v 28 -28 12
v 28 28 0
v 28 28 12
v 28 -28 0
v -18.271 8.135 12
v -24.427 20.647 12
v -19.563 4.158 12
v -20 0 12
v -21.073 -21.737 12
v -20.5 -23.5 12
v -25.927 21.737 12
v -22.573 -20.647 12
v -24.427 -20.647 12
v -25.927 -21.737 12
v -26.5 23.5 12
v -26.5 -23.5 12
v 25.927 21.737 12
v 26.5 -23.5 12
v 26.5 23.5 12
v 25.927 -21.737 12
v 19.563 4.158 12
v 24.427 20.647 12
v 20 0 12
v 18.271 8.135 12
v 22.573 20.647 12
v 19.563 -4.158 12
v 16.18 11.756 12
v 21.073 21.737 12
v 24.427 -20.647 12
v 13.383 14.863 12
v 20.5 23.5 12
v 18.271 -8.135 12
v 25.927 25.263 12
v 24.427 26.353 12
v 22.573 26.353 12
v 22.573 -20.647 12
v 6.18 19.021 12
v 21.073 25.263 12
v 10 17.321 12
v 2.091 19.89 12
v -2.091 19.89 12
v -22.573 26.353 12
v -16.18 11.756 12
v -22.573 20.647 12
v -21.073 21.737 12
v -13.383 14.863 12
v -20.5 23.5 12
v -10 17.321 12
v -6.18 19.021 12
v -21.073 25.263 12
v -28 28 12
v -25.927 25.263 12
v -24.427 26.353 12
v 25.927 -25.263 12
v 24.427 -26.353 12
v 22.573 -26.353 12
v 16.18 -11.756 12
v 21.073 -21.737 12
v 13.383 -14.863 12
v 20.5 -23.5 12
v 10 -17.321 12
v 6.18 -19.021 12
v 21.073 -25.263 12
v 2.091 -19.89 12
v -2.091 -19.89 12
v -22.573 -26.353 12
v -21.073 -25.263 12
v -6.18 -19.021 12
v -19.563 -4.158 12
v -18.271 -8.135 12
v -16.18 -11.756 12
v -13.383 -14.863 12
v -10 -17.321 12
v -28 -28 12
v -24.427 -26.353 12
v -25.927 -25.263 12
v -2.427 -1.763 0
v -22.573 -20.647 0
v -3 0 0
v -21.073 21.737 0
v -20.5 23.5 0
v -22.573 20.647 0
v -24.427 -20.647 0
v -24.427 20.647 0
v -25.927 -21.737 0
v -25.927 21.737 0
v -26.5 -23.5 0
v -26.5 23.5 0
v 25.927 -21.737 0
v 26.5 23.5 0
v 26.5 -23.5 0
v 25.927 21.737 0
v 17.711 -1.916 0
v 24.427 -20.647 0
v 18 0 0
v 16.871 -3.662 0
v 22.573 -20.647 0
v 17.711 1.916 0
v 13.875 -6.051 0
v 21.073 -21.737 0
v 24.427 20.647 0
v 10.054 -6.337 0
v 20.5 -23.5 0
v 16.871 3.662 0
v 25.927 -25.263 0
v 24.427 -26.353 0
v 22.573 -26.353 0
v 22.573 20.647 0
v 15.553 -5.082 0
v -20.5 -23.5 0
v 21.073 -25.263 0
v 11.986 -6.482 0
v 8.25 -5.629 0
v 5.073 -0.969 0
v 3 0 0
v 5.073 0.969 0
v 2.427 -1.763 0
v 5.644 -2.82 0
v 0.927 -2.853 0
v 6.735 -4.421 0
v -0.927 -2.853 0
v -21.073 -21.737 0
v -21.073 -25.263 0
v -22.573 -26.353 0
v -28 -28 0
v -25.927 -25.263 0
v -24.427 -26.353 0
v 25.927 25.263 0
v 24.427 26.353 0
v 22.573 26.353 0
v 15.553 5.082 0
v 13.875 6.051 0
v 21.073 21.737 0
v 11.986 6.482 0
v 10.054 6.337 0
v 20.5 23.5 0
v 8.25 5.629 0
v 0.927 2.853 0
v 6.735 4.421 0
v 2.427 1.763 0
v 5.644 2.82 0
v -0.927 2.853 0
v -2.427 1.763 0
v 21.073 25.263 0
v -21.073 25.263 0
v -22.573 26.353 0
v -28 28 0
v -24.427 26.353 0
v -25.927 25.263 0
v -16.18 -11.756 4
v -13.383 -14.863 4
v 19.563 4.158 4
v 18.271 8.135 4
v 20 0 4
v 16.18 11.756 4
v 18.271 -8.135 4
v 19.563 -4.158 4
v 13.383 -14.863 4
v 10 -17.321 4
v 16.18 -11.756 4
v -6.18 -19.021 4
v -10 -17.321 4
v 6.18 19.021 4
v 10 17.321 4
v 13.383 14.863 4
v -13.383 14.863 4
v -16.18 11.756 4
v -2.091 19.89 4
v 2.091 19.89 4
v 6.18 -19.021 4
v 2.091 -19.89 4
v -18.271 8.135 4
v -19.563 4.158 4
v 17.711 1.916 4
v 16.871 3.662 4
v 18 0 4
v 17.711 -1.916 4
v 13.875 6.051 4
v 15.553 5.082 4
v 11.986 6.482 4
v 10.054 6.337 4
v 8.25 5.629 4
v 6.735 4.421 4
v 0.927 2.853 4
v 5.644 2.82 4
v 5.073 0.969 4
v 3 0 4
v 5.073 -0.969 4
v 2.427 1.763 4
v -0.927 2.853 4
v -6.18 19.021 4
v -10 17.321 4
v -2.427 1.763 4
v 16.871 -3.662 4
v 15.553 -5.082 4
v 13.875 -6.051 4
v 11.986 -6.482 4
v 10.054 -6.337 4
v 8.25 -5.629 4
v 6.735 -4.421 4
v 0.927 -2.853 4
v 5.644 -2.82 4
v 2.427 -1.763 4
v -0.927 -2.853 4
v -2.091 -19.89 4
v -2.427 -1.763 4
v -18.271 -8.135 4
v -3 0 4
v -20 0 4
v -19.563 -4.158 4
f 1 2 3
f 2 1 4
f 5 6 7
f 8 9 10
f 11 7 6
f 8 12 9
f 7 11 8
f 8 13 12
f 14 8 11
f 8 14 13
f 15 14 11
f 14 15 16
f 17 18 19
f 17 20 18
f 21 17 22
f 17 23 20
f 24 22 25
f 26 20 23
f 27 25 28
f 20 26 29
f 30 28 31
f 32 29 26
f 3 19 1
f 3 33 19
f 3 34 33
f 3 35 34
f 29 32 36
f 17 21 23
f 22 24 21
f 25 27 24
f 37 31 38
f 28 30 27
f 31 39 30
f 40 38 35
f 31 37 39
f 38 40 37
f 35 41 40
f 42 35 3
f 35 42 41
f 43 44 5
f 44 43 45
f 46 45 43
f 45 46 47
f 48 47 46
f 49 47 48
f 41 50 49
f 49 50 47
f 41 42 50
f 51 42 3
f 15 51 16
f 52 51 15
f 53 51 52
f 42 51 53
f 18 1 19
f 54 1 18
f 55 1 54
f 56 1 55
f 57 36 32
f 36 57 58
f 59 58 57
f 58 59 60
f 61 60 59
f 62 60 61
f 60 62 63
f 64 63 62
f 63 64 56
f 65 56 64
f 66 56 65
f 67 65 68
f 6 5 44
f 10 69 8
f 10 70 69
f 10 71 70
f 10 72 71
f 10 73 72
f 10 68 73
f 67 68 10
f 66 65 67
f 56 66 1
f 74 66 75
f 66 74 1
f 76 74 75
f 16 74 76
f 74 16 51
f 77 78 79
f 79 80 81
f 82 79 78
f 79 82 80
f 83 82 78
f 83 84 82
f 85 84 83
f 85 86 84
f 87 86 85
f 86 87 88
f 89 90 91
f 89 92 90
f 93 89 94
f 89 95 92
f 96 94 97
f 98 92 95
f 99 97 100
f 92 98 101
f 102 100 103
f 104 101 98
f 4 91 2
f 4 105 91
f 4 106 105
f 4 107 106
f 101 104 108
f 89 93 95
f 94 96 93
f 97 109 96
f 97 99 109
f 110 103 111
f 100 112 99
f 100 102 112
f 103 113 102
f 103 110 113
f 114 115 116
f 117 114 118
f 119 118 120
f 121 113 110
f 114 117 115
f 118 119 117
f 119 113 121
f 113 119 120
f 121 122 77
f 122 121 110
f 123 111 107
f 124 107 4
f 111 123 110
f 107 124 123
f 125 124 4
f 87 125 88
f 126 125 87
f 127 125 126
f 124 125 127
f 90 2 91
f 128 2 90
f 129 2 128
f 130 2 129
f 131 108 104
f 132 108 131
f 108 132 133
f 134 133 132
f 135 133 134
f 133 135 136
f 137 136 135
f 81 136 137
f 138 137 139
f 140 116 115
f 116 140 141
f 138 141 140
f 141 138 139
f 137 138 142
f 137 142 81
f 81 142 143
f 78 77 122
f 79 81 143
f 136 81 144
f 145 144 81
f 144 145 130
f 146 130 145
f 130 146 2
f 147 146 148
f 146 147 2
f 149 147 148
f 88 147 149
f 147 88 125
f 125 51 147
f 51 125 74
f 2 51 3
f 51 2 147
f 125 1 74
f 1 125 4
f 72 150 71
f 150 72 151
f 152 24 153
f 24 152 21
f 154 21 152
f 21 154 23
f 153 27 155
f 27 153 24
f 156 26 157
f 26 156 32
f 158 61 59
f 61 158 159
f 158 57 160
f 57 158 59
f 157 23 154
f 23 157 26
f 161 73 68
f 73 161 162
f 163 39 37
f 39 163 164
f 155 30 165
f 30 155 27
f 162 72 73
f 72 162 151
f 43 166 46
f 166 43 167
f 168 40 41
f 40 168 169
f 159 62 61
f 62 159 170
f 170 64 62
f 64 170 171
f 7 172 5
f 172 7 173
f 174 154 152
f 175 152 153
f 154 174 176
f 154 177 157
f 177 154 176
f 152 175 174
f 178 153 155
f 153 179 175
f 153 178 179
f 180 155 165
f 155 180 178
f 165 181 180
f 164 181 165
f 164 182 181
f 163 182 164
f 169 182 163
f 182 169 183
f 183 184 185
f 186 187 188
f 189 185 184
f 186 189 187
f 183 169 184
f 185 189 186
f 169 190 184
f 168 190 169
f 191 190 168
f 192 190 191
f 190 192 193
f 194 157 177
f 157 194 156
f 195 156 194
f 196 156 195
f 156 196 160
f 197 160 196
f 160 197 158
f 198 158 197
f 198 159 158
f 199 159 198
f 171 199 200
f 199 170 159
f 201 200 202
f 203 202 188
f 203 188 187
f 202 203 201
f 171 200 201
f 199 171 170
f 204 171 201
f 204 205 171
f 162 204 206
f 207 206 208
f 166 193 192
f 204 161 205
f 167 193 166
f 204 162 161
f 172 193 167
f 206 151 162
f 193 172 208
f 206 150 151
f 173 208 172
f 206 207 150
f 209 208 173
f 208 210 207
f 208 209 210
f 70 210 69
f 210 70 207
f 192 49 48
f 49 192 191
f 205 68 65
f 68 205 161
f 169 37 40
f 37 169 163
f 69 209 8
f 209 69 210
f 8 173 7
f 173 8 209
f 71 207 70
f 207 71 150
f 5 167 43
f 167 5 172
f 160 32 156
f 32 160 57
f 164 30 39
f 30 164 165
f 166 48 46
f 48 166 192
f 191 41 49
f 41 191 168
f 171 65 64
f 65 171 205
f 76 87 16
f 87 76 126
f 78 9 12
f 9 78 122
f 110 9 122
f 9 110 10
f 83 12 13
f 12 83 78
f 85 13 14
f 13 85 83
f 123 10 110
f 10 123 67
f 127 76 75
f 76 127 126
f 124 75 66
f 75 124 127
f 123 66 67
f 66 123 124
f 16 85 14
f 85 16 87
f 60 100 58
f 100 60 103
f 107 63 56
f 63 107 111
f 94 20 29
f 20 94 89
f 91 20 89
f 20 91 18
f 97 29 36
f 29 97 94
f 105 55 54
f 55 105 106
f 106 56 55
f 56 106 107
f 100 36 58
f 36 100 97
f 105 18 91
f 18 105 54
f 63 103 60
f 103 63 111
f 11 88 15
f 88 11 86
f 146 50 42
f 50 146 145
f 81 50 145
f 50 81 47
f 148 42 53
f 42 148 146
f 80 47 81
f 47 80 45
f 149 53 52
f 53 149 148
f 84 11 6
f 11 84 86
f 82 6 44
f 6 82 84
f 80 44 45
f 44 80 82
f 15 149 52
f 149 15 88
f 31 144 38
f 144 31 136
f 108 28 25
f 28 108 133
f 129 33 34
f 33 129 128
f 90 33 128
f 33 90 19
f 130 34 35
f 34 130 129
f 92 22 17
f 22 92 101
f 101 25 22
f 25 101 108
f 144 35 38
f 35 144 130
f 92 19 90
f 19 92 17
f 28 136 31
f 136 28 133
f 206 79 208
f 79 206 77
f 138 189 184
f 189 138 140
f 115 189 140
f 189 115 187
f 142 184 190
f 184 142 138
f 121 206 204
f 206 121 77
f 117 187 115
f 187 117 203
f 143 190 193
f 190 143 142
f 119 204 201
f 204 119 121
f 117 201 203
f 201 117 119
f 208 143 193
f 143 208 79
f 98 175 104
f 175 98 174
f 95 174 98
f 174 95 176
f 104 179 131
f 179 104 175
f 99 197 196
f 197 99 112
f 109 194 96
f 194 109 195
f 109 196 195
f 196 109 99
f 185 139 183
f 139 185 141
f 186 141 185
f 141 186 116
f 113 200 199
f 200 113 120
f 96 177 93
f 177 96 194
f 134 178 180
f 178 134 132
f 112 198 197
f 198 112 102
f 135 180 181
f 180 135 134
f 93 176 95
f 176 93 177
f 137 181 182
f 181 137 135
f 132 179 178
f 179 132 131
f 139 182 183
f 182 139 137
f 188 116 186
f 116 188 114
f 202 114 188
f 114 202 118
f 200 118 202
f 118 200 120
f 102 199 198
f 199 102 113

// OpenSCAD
difference () {
	translate([-28, -28,0]) cube ([56, 56,12]);
	translate([0, 0, 4]) cylinder (r=20,h=15);
	translate([-23.5, -23.5, -1]) cylinder(r=3,h=17);
	translate([23.5, -23.5, -1]) cylinder(r=3,h=17);
	translate([-23.5, 23.5, -1]) cylinder(r=3,h=17);
	translate([23.5, 23.5, -1]) cylinder(r=3,h=17);
	translate([0, 0, -1]) cylinder(r=3,h=17);
	translate([11.5, 0, -1]) cylinder(r=13/2,h=17);
}
